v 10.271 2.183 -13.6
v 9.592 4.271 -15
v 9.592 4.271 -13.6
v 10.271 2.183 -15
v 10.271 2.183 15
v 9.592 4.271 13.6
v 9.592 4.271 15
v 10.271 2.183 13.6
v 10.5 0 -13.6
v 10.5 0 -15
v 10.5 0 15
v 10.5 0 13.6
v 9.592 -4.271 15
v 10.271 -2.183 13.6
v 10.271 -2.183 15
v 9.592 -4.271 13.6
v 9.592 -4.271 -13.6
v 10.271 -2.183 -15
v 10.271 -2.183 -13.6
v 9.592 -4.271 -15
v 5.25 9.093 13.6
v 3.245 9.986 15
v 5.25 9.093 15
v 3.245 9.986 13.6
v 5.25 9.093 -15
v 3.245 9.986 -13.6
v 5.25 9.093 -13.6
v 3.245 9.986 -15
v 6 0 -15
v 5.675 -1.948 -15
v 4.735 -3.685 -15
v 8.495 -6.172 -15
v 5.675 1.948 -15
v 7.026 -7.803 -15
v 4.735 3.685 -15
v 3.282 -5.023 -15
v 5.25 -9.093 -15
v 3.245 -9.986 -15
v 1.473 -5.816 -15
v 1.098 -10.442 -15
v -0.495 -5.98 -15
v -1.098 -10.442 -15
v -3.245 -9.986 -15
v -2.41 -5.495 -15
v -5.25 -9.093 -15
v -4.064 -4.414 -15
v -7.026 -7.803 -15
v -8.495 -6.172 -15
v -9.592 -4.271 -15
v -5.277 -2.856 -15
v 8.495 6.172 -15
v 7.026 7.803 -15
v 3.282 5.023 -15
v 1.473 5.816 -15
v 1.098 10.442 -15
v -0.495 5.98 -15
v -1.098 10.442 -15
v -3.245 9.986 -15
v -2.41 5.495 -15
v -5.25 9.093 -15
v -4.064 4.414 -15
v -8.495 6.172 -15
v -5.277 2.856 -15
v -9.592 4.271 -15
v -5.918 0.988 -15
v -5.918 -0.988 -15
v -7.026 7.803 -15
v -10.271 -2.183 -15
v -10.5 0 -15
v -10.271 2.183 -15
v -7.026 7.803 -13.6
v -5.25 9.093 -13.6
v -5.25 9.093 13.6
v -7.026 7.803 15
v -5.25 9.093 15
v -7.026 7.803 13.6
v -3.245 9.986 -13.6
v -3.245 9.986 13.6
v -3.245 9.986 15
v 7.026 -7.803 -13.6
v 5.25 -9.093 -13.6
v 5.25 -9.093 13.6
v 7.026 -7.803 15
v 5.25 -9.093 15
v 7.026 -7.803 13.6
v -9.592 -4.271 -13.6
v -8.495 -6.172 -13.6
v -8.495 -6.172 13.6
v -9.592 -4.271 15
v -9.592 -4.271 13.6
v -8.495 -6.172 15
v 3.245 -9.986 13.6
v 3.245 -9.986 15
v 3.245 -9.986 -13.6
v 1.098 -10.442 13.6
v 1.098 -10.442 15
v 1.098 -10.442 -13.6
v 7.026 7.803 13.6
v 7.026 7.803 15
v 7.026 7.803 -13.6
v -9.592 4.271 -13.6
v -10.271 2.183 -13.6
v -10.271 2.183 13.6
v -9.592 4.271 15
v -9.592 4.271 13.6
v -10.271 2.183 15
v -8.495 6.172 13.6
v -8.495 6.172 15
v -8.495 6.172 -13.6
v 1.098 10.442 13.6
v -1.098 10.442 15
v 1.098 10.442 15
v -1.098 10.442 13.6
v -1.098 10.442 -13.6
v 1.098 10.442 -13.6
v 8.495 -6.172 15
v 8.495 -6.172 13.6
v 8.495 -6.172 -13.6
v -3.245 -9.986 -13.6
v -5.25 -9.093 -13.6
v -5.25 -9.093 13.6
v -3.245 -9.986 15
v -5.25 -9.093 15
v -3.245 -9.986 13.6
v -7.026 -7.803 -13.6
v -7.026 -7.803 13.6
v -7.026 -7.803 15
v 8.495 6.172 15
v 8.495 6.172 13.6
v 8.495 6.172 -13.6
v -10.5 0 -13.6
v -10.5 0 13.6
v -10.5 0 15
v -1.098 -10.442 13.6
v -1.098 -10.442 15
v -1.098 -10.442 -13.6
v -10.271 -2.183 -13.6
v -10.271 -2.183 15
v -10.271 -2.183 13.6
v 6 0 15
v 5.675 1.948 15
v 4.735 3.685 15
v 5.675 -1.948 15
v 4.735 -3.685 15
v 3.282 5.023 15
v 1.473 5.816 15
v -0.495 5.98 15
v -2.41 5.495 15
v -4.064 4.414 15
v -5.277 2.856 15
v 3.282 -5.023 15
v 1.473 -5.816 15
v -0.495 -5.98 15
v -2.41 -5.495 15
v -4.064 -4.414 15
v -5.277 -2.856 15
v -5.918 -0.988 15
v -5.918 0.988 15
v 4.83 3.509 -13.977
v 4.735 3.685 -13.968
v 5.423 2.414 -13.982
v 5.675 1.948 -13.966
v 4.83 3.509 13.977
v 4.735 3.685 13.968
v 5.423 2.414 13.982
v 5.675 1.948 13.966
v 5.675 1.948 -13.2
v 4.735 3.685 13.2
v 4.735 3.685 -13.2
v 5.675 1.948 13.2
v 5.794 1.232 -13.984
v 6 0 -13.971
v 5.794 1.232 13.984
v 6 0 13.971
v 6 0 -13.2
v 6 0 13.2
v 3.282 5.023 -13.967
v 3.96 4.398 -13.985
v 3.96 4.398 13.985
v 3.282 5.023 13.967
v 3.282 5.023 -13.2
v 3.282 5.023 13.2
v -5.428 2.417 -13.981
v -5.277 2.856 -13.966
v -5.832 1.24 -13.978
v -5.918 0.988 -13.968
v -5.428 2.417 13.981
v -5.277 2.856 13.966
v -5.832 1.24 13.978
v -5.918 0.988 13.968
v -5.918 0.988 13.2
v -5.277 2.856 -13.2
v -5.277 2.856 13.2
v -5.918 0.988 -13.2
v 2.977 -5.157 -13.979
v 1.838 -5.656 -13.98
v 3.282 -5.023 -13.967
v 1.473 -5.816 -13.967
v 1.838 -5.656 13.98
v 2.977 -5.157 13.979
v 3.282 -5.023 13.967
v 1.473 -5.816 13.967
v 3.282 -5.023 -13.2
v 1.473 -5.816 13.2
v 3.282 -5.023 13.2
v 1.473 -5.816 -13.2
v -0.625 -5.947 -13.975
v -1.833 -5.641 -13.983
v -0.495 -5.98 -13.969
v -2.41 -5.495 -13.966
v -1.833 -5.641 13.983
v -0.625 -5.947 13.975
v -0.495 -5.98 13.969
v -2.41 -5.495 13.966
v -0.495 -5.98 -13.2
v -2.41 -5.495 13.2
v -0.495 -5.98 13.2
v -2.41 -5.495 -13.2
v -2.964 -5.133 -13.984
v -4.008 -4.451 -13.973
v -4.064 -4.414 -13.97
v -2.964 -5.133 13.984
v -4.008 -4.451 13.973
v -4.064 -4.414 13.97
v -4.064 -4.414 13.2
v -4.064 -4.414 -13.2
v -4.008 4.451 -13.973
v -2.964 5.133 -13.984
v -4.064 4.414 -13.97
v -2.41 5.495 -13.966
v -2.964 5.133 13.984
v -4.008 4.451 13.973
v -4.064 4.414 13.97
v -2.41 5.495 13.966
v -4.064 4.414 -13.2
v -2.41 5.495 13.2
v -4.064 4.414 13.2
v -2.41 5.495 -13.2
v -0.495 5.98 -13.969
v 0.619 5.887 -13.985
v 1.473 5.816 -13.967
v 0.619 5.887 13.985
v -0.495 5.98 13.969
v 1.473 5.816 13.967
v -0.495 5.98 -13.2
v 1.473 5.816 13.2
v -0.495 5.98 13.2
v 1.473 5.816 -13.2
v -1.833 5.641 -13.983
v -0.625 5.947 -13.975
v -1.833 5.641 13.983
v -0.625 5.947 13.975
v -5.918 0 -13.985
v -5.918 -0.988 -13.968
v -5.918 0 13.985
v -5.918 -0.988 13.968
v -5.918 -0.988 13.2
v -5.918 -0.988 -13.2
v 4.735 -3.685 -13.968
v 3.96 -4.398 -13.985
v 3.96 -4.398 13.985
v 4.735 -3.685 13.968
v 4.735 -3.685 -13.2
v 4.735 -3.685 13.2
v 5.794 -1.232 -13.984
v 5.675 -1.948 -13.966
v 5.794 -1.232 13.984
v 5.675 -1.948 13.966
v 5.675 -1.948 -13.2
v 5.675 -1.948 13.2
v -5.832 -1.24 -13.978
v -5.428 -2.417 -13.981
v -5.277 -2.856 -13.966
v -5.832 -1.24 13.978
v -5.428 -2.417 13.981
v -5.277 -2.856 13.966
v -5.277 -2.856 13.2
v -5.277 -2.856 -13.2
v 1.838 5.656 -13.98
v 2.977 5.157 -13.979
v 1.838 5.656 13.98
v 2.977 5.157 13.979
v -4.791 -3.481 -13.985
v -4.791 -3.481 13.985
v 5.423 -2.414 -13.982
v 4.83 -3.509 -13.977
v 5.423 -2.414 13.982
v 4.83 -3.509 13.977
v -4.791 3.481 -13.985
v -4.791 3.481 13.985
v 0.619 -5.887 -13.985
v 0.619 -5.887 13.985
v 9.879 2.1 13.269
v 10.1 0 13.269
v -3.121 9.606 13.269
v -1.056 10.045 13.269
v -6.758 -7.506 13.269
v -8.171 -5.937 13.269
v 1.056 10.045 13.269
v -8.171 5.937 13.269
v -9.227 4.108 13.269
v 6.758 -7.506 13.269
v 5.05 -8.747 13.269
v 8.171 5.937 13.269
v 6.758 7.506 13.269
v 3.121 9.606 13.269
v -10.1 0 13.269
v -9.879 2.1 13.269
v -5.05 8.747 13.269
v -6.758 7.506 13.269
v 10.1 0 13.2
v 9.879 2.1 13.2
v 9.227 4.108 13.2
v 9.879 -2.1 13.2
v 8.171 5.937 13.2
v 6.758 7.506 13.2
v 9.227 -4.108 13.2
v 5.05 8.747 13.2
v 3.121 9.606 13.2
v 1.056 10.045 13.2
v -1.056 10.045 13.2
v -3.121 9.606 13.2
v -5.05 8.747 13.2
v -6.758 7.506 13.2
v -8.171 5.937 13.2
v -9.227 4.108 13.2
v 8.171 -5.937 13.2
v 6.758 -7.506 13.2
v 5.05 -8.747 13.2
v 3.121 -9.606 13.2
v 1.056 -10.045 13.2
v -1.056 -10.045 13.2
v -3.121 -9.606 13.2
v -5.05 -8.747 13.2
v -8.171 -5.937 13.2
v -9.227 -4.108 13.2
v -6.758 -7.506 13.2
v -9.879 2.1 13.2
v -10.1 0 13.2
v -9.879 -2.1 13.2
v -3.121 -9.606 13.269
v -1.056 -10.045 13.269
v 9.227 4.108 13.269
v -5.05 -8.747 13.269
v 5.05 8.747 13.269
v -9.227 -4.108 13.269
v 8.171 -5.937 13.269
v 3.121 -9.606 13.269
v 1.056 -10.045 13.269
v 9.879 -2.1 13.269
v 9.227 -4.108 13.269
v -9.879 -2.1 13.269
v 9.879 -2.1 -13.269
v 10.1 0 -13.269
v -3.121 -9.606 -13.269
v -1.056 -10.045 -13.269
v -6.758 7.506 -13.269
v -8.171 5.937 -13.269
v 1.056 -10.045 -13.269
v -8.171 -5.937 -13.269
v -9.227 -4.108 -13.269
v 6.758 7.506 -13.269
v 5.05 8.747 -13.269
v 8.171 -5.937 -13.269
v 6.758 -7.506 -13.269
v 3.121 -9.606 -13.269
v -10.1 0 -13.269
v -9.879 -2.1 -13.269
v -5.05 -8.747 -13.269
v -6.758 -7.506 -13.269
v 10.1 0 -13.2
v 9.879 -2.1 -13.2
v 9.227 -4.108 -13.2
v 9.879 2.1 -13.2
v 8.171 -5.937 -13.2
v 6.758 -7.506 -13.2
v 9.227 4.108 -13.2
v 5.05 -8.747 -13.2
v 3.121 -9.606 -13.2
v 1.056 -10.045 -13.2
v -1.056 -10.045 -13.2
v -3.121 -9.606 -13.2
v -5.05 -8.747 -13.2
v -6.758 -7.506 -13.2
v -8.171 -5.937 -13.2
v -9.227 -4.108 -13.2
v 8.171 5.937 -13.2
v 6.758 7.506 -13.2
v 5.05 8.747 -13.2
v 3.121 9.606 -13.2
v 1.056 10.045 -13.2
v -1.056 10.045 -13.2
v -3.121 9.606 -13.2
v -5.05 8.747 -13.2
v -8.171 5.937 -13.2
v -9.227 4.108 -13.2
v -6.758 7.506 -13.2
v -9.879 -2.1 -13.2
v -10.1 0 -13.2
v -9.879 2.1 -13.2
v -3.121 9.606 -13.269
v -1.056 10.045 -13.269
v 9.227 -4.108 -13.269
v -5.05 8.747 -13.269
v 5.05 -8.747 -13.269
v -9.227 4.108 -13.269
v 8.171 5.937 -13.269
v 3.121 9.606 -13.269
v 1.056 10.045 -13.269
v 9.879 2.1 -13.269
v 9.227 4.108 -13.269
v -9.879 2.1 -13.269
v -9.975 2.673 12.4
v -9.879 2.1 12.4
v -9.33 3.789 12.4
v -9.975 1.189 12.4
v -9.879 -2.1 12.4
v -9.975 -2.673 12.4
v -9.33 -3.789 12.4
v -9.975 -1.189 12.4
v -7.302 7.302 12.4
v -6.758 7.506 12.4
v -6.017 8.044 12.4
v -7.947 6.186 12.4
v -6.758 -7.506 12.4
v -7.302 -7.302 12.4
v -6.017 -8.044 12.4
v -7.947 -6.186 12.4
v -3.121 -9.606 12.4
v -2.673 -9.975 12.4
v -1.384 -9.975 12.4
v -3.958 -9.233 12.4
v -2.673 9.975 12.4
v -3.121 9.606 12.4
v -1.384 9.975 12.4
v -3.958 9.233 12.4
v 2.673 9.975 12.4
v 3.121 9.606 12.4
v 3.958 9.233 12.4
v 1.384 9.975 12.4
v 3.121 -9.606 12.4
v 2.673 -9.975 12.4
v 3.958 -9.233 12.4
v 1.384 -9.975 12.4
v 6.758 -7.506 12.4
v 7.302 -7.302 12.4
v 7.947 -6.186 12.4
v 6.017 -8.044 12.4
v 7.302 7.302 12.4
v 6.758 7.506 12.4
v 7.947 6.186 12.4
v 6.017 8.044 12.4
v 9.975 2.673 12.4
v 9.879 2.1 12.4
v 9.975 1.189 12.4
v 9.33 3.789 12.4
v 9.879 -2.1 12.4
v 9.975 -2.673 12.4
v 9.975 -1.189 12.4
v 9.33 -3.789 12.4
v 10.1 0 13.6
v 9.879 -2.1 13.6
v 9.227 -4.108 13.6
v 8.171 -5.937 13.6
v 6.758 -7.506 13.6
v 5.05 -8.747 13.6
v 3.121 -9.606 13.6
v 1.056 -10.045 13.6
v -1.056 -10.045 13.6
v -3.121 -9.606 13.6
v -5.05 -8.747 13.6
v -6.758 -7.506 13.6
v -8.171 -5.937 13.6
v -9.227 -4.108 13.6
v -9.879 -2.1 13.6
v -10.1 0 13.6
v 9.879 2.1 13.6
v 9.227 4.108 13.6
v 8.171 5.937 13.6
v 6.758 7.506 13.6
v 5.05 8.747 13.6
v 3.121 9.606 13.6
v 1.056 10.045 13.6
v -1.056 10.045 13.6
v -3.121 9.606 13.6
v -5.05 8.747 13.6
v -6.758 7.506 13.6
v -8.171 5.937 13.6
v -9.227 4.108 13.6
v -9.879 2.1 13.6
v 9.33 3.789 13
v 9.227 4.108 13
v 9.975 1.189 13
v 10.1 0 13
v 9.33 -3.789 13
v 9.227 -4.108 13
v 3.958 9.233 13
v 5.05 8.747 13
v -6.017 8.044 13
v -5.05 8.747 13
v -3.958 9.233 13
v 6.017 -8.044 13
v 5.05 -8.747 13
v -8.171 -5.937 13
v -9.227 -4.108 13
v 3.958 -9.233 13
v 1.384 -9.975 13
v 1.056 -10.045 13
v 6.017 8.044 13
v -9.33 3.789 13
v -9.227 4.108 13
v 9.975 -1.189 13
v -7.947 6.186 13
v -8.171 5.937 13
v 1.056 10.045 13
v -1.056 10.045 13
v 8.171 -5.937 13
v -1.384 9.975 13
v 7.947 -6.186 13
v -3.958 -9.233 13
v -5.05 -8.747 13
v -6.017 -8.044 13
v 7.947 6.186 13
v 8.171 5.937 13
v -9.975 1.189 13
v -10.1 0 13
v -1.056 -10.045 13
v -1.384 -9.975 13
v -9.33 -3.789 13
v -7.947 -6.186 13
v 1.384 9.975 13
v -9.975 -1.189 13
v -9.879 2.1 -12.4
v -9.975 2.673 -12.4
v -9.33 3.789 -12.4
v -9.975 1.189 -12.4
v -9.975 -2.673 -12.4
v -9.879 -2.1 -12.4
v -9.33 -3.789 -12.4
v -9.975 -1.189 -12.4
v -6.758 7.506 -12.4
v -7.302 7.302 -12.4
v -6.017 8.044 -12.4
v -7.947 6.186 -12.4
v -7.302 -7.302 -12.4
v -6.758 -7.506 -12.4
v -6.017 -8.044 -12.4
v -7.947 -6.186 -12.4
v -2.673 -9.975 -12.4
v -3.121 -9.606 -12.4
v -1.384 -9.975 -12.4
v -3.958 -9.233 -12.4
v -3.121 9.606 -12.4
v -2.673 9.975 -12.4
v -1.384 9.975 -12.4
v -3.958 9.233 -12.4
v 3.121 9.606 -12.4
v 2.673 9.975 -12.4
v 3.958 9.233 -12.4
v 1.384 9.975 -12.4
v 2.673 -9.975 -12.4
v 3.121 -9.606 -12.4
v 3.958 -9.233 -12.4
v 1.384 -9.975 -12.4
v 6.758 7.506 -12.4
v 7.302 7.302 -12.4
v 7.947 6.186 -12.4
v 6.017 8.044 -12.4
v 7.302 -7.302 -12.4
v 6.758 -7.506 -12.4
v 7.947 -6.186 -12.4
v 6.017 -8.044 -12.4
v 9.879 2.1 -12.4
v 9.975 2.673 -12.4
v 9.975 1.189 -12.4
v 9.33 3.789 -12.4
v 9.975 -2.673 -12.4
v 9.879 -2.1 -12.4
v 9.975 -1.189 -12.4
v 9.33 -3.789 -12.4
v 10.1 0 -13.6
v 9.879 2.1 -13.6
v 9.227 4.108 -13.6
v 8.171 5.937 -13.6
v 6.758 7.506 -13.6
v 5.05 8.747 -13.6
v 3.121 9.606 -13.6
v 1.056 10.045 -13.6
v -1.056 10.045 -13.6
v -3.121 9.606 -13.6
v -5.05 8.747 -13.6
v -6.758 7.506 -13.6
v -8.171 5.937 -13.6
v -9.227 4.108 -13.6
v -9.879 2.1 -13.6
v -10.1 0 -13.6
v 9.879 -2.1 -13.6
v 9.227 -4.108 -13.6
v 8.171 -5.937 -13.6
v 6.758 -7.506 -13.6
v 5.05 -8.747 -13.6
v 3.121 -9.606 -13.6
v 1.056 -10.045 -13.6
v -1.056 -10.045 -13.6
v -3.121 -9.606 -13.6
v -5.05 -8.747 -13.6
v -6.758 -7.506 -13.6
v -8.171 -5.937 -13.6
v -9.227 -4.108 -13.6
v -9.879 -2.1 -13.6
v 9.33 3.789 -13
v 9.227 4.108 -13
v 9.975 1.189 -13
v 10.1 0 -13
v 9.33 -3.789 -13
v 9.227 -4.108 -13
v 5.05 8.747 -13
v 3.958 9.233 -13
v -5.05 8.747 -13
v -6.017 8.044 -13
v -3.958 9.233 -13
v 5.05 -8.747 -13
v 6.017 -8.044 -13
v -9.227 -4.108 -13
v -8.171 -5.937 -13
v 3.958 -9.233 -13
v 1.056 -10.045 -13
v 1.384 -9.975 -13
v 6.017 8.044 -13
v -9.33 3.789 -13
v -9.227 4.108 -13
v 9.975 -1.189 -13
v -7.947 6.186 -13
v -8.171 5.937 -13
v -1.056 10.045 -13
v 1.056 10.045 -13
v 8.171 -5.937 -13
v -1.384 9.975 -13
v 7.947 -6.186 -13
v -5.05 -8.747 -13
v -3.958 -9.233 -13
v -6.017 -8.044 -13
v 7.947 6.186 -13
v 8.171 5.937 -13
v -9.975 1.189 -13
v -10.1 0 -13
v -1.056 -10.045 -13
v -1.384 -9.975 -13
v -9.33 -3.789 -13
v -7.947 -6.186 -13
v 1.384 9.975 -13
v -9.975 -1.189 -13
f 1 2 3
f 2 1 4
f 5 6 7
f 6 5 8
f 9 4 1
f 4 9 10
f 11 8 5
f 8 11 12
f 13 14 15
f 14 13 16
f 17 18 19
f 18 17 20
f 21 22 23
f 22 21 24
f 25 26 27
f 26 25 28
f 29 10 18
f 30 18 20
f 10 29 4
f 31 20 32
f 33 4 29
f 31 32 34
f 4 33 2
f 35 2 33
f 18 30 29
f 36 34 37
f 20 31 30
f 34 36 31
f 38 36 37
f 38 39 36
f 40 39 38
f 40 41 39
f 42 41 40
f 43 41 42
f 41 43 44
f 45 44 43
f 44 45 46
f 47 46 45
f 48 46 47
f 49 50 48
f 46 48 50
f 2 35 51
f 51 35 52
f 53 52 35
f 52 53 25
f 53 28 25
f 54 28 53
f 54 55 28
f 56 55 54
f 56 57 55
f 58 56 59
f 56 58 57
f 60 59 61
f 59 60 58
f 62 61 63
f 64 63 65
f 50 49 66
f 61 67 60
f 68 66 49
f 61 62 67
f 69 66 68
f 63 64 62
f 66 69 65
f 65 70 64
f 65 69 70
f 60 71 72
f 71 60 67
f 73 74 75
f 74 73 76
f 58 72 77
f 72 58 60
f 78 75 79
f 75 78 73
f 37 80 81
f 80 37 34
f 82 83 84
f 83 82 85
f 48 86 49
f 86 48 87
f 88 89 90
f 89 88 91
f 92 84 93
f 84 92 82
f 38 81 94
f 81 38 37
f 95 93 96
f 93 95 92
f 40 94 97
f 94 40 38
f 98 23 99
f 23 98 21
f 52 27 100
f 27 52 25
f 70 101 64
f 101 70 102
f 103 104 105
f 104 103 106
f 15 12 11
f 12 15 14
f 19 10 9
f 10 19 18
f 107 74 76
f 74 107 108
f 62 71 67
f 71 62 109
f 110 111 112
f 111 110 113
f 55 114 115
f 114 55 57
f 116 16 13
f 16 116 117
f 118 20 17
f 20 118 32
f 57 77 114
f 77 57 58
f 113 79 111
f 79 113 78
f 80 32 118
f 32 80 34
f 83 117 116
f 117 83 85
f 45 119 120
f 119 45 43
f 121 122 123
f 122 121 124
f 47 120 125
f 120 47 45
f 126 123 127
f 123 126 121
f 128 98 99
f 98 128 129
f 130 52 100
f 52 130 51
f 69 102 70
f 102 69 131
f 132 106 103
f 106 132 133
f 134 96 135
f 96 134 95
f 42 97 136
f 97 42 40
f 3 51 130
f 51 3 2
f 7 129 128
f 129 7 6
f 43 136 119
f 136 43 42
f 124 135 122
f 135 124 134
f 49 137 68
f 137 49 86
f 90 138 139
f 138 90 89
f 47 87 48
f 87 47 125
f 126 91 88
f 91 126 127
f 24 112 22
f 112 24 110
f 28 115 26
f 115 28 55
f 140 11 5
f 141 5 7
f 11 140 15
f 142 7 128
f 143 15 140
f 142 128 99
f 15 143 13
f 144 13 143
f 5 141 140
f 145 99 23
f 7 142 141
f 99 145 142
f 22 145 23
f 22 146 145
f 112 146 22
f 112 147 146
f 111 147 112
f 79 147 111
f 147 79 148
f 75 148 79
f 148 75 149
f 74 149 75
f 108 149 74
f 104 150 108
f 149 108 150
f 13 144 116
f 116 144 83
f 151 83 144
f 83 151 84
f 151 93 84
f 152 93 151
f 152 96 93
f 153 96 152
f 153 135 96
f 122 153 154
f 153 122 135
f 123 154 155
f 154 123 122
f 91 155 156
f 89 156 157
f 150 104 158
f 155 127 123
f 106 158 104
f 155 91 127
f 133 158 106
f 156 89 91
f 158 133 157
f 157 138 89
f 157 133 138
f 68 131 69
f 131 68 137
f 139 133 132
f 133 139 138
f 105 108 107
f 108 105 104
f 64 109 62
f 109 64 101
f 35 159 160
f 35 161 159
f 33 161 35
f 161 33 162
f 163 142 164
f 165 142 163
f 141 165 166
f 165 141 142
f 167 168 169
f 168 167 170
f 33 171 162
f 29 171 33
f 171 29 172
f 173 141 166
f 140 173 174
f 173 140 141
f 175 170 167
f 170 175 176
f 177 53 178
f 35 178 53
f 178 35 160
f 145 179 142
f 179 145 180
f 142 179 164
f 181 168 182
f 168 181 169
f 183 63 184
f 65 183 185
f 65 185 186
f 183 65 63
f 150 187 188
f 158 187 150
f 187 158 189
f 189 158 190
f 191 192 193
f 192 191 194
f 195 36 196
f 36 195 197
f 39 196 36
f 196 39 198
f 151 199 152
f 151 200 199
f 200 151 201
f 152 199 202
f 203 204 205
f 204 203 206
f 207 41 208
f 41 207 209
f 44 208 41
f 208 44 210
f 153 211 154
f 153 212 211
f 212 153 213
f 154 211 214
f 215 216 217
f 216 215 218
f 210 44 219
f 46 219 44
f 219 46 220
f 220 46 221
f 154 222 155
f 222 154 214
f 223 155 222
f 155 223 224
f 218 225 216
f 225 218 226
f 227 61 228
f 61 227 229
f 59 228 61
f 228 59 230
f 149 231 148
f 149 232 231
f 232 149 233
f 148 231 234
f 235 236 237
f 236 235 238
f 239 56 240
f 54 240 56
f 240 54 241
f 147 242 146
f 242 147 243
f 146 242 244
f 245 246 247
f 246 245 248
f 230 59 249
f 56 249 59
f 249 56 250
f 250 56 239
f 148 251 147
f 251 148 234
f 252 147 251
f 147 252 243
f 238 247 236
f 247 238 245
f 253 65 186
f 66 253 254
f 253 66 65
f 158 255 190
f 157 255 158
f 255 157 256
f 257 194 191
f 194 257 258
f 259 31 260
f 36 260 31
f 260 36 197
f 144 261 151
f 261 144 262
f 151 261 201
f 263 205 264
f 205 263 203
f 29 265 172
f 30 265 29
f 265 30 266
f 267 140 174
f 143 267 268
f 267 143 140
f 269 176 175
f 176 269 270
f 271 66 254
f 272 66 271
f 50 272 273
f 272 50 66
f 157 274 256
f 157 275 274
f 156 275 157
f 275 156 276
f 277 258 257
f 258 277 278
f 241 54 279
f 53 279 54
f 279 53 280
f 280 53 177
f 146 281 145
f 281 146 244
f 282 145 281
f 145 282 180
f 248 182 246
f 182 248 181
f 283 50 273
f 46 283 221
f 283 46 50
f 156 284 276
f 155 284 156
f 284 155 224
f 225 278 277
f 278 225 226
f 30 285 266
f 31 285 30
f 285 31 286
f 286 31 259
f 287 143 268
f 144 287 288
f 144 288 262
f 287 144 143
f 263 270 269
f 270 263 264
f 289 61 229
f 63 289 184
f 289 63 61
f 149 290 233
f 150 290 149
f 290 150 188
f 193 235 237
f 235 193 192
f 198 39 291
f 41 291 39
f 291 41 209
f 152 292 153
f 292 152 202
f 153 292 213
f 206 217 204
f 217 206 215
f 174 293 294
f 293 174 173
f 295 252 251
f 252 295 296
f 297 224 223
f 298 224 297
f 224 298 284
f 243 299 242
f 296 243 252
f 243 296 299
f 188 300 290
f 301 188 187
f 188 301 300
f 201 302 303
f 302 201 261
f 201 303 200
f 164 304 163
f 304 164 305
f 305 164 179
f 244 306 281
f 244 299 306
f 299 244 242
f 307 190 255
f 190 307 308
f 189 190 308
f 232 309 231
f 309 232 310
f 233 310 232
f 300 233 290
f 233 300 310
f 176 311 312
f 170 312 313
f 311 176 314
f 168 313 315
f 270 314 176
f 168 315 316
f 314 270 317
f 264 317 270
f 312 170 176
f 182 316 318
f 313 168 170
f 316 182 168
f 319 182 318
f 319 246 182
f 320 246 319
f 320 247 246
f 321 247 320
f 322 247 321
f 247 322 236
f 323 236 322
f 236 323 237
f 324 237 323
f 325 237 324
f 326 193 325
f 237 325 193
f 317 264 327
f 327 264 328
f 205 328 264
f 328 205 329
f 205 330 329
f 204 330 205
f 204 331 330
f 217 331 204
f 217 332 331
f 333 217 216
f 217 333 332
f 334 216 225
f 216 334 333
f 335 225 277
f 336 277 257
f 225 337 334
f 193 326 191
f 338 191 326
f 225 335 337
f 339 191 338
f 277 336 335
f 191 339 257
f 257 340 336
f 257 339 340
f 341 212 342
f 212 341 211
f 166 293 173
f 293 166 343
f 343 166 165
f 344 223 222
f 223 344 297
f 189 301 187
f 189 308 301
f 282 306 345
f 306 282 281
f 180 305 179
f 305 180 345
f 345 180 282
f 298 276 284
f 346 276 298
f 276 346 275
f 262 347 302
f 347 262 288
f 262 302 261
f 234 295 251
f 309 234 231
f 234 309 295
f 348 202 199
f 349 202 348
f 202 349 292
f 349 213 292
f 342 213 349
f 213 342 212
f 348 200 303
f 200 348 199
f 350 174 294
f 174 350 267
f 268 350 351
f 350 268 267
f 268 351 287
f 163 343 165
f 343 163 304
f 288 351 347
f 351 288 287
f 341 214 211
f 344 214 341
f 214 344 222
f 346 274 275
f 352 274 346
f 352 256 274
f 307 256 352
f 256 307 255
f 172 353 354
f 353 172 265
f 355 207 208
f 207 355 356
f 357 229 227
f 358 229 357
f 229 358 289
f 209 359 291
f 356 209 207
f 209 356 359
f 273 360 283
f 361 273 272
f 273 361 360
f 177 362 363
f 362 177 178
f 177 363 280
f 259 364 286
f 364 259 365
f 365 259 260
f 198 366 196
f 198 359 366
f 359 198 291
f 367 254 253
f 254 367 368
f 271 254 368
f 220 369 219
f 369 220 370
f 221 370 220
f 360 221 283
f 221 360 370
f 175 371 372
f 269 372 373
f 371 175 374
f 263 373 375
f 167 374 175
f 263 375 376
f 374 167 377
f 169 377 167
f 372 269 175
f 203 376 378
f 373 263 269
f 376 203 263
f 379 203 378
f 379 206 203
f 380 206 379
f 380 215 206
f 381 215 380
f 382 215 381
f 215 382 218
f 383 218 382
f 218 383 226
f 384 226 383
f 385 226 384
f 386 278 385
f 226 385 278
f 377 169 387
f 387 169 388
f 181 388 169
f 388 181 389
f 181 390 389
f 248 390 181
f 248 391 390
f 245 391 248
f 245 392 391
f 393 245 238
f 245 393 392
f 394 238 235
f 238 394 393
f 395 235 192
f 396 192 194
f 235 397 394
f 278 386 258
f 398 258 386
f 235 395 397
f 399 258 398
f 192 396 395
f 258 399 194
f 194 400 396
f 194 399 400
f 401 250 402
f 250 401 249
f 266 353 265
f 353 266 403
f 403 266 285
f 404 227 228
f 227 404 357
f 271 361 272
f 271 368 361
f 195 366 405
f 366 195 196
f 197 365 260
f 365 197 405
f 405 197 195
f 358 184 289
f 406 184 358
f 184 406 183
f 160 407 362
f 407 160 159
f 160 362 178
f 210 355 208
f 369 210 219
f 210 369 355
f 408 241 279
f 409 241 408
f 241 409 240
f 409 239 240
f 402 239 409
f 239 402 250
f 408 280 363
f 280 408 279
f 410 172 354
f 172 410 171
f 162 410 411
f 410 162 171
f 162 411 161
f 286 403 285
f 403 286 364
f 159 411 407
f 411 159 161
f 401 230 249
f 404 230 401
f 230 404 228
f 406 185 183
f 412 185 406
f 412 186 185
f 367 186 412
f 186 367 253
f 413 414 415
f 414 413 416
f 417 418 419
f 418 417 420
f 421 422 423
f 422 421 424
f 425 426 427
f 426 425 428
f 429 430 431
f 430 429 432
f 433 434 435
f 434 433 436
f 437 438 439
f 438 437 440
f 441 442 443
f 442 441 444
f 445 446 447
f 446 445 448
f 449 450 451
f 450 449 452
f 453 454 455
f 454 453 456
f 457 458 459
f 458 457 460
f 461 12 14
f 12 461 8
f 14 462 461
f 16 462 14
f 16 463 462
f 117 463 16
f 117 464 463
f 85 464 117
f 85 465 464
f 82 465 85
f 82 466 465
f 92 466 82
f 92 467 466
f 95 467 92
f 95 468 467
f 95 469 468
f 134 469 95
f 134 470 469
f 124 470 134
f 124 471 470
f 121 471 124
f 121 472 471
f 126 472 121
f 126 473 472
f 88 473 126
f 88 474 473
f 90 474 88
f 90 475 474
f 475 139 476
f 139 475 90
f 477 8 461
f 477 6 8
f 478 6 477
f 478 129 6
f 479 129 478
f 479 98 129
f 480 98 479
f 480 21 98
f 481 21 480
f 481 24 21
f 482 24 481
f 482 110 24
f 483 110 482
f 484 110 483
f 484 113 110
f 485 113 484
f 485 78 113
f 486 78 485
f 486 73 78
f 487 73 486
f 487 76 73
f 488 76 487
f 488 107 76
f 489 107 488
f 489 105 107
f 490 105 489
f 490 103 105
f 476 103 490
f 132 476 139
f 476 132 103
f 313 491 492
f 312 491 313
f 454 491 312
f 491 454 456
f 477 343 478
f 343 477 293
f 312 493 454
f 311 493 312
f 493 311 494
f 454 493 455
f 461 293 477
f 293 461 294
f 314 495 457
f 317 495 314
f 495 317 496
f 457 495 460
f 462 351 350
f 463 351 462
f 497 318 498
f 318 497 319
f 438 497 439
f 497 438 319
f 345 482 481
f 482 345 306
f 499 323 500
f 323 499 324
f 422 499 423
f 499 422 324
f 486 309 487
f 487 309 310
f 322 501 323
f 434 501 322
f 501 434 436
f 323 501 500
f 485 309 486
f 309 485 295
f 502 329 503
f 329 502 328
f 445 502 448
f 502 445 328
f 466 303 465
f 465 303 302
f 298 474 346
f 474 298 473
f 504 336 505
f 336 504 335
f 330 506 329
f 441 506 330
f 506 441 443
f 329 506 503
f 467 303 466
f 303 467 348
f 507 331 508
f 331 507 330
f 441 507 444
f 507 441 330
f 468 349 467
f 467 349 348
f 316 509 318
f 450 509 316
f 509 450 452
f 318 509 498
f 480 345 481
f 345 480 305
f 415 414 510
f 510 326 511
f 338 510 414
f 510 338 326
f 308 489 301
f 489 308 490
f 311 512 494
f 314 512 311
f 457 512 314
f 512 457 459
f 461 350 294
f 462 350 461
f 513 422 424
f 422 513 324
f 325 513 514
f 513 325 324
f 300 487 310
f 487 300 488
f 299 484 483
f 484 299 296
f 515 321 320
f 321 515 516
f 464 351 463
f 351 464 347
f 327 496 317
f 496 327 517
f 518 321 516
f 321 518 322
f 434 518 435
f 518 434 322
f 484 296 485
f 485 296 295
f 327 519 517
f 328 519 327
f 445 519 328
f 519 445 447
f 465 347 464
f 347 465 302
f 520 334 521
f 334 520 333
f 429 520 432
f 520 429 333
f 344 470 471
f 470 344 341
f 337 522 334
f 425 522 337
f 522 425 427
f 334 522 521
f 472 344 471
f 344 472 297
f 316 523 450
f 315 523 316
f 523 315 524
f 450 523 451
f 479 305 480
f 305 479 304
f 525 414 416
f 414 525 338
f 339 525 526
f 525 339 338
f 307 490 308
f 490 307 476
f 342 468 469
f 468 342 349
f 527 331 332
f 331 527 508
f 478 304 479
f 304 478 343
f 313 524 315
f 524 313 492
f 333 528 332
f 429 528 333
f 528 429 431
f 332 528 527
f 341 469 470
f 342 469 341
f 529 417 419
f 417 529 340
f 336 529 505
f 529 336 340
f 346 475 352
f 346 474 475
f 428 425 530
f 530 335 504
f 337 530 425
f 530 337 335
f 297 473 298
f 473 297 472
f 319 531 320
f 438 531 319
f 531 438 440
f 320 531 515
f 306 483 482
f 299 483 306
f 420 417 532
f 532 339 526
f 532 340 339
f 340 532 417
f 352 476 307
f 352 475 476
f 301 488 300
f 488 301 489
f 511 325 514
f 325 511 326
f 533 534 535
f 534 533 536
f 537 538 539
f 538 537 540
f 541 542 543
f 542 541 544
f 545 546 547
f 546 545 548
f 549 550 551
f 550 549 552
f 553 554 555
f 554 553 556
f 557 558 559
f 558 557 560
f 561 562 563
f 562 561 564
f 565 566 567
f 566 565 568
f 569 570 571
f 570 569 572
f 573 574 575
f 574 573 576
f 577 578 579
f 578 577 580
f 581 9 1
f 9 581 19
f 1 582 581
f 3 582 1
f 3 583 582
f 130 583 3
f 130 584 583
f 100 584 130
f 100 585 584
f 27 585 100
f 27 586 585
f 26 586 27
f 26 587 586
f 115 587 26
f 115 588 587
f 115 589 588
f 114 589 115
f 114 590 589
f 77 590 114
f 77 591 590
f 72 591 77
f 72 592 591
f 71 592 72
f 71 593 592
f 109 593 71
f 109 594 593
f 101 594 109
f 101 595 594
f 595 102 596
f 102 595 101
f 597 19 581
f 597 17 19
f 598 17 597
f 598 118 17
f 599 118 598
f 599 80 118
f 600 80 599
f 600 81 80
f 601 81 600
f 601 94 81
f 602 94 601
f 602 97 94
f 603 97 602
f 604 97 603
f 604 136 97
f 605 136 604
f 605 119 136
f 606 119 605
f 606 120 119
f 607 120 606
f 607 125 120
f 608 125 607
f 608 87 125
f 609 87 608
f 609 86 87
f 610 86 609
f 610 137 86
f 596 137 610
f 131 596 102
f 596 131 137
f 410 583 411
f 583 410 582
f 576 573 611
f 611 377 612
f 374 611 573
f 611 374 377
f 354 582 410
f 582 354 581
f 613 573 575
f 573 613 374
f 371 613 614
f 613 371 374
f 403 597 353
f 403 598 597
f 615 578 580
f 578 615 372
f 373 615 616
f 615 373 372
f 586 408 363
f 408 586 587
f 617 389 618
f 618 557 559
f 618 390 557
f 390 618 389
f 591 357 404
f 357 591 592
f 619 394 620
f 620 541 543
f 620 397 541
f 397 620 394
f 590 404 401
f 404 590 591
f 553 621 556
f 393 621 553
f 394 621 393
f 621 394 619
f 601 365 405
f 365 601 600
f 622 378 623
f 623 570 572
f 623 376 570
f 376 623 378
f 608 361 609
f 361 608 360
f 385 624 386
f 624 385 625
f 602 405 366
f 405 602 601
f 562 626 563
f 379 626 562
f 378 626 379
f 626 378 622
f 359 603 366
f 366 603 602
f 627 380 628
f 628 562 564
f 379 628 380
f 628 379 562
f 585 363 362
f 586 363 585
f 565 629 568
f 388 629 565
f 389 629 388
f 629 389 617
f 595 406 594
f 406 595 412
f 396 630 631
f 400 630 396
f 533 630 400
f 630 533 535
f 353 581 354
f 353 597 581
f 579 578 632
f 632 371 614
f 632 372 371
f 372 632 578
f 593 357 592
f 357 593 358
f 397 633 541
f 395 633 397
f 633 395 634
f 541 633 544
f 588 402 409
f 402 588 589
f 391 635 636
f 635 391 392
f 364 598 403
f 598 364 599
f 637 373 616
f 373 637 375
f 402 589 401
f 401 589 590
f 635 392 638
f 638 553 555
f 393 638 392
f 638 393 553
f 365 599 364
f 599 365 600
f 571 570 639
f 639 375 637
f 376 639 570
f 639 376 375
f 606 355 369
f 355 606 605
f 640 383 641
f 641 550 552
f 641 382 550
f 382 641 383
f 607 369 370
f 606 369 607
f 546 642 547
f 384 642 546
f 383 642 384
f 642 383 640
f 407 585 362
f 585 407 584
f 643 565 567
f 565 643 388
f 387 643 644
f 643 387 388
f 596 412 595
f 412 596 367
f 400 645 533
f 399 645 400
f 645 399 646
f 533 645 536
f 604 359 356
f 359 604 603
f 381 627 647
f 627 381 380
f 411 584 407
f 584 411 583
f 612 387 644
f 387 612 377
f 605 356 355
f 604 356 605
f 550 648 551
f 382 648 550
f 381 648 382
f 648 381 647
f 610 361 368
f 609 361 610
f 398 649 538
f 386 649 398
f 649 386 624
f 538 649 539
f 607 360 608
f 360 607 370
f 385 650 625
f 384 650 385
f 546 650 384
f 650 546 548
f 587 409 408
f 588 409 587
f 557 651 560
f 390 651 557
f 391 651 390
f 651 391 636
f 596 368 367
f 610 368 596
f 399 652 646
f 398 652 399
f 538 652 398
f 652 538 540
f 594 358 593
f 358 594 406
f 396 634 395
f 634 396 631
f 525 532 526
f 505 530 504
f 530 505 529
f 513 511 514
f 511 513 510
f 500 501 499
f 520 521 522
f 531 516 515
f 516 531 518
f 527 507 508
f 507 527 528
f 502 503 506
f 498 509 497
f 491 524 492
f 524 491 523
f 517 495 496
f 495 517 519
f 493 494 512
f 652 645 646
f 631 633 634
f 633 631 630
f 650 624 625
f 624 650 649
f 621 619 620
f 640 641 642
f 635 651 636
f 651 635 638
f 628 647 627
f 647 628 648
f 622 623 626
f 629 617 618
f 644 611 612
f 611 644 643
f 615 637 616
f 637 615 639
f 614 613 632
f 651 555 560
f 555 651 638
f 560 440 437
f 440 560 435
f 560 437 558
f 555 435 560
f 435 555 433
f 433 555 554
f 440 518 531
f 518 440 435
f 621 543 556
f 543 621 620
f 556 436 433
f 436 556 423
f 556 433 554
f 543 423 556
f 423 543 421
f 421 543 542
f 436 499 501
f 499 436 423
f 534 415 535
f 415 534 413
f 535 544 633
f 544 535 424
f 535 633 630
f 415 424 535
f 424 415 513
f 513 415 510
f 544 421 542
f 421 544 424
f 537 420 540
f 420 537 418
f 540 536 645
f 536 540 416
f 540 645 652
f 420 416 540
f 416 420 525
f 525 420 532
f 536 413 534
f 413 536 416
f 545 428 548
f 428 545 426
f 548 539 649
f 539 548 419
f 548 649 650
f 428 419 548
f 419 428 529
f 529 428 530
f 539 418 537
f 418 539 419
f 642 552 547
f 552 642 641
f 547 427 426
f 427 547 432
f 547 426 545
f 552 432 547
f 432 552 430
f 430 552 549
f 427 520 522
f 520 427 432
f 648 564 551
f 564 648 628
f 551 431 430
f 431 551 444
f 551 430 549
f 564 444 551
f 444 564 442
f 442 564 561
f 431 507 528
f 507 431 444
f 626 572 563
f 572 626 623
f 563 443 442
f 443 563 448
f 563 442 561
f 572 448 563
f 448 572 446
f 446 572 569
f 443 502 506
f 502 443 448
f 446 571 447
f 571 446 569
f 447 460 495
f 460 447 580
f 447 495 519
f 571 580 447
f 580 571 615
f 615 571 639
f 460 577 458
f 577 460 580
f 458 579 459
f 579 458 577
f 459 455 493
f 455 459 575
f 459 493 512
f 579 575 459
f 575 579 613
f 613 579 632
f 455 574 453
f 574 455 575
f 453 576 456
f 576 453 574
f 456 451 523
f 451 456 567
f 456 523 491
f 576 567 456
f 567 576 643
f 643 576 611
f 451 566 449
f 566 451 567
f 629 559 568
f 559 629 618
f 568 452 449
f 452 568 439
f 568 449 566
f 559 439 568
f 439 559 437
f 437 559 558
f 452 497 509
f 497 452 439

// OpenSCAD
// Parameters
bore_d = 12.0; //[6.0:24.0:0.1]
outer_d = 21.0; //[10.5:42.0:0.1]
length = 30.0; //[15.0:60.0:0.1]
chamfer_len = 0.8; //[0.4:1.6:0.05]
overlap = 1.0; //[0.5:2.0:0.1]
seal_groove_width = 1.2; //[0.6:2.4:0.05]
seal_groove_depth = 0.4; //[0.2:0.8:0.05]
seal_groove_offset = 2.0; //[1.0:4.0:0.1]
lube_groove_count = 12; //[6:24:1]
lube_groove_width = 0.8; //[0.4:1.6:0.05]
lube_groove_depth = 0.25; //[0.1:0.6:0.05]
lube_groove_length = 26.0; //[10.0:58.0:0.1]

// Base Shapes
module outer_cylinder_body() {
  cylinder(h=length, r=outer_d/2, center=true);
}

module through_bore() {
  cylinder(h=length + 2*overlap, r=bore_d/2, center=true);
}

module end_chamfer_top() {
  translate([0, 0, length/2 - (chamfer_len + overlap)/2])
    cylinder(h=chamfer_len + overlap, r1=outer_d/2, r2=0, center=true);
}

module end_chamfer_bottom() {
  translate([0, 0, -length/2 + (chamfer_len + overlap)/2])
    rotate([180, 0, 0])
    cylinder(h=chamfer_len + overlap, r1=outer_d/2, r2=0, center=true);
}

module seal_groove_top() {
  translate([0, 0, length/2 - seal_groove_offset])
    cylinder(h=seal_groove_width, r=outer_d/2, center=true);
}

module seal_groove_top_inner() {
  translate([0, 0, length/2 - seal_groove_offset])
    cylinder(h=seal_groove_width + 2*overlap, r=outer_d/2 - seal_groove_depth, center=true);
}

module seal_groove_bottom() {
  translate([0, 0, -length/2 + seal_groove_offset])
    cylinder(h=seal_groove_width, r=outer_d/2, center=true);
}

module seal_groove_bottom_inner() {
  translate([0, 0, -length/2 + seal_groove_offset])
    cylinder(h=seal_groove_width + 2*overlap, r=outer_d/2 - seal_groove_depth, center=true);
}

module lube_groove_cutter(angle) {
  rotate([0, 0, angle])
    translate([0, outer_d/2 - lube_groove_depth/2, 0])
    cube([outer_d + 2*overlap, lube_groove_width, lube_groove_length], center=true);
}

// Operations
module end_chamfers() {
  union() {
    end_chamfer_top();
    end_chamfer_bottom();
  }
}

module seal_groove_ring_top() {
  difference() {
    seal_groove_top();
    seal_groove_top_inner();
  }
}

module seal_groove_ring_bottom() {
  difference() {
    seal_groove_bottom();
    seal_groove_bottom_inner();
  }
}

module seal_grooves() {
  union() {
    seal_groove_ring_top();
    seal_groove_ring_bottom();
  }
}

module outer_surface_knurl_or_lubrication_features() {
  union() {
    for (i = [0:lube_groove_count-1]) {
      lube_groove_cutter(i*360/lube_groove_count);
    }
  }
}

module outer_minus_bore() {
  difference() {
    outer_cylinder_body();
    through_bore();
  }
}

module outer_minus_bore_minus_chamfers() {
  difference() {
    outer_minus_bore();
    end_chamfers();
  }
}

module outer_minus_bore_minus_chamfers_minus_seal_grooves() {
  difference() {
    outer_minus_bore_minus_chamfers();
    seal_grooves();
  }
}

module bearing_complete_no_marking() {
  difference() {
    outer_minus_bore_minus_chamfers_minus_seal_grooves();
    outer_surface_knurl_or_lubrication_features();
  }
}

// Final Output
color("Silver") bearing_complete_no_marking();
